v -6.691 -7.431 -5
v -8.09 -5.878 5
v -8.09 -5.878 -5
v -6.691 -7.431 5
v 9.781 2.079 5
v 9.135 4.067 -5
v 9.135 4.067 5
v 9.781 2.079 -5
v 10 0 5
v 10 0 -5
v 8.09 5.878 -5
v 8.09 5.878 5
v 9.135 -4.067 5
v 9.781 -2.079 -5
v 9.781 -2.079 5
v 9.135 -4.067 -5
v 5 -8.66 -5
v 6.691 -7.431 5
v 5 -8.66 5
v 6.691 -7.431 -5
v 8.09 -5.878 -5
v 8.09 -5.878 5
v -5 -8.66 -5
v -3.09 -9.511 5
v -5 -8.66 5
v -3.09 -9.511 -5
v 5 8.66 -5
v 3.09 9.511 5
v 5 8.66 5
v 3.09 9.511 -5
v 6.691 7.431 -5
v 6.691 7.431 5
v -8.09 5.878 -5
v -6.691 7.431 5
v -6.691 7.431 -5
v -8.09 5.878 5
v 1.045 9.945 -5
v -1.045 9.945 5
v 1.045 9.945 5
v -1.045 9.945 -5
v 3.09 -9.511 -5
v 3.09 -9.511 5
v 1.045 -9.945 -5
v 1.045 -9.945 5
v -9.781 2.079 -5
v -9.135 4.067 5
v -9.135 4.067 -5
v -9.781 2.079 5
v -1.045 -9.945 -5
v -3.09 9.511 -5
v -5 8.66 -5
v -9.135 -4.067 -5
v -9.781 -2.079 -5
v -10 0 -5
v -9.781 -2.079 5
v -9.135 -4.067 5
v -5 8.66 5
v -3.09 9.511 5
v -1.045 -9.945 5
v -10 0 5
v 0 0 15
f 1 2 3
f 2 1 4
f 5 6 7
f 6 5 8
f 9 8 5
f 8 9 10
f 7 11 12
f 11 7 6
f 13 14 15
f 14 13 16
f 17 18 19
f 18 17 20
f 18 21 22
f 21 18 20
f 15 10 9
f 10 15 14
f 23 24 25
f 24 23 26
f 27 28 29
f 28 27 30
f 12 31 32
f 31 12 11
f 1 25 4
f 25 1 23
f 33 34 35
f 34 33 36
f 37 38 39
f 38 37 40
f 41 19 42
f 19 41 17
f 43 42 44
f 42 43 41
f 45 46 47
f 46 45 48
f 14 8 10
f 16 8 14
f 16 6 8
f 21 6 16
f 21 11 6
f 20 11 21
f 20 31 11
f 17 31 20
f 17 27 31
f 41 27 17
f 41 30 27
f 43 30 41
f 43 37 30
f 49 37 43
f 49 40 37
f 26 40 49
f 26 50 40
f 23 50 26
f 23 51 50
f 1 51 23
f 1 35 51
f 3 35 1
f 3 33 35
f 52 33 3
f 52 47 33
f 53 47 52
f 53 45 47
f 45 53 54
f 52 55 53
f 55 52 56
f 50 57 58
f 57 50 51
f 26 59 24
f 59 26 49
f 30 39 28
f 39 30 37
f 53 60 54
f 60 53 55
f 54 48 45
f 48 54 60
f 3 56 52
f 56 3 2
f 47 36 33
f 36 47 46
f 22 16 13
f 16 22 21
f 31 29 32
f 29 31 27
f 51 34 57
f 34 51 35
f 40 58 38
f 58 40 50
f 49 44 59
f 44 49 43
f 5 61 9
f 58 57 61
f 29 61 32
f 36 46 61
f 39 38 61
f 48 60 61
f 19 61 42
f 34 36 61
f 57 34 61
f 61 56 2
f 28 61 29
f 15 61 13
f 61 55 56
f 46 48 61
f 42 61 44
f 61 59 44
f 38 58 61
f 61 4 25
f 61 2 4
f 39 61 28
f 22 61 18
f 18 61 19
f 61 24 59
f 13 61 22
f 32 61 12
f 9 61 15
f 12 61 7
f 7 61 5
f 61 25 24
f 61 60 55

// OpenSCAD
// Generated by SolidPython 0.4.5 on 2019-12-22 19:00:25


union() {
	cylinder(center = true, h = 10, r = 10);
	translate(v = [0, 0, 5]) {
		cylinder(h = 10, r1 = 10, r2 = 0);
	}
}
/***********************************************
*********      SolidPython code:      **********
************************************************
 
#! /usr/bin/env python3
import sys

from solid import scad_render_to_file
from solid.objects import cylinder
from solid.utils import up

SEGMENTS = 48


def show_appended_python_code():
    a = cylinder(r=10, h=10, center=True) + up(5)(cylinder(r1=10, r2=0, h=10))

    return a


if __name__ == '__main__':
    out_dir = sys.argv[1] if len(sys.argv) > 1 else None
    a = show_appended_python_code()

    # ================================================================
    # = include_orig_code appends all python code as comments to the
    # = bottom of the generated OpenSCAD code, so the final document
    # = contains the easy-to-read python code as well as the SCAD.
    # = ------------------------------------------------------------ =
    file_out = scad_render_to_file(a, out_dir=out_dir, include_orig_code=True)
    print(f"{__file__}: SCAD file written to: \n{file_out}")
 
 
************************************************/
